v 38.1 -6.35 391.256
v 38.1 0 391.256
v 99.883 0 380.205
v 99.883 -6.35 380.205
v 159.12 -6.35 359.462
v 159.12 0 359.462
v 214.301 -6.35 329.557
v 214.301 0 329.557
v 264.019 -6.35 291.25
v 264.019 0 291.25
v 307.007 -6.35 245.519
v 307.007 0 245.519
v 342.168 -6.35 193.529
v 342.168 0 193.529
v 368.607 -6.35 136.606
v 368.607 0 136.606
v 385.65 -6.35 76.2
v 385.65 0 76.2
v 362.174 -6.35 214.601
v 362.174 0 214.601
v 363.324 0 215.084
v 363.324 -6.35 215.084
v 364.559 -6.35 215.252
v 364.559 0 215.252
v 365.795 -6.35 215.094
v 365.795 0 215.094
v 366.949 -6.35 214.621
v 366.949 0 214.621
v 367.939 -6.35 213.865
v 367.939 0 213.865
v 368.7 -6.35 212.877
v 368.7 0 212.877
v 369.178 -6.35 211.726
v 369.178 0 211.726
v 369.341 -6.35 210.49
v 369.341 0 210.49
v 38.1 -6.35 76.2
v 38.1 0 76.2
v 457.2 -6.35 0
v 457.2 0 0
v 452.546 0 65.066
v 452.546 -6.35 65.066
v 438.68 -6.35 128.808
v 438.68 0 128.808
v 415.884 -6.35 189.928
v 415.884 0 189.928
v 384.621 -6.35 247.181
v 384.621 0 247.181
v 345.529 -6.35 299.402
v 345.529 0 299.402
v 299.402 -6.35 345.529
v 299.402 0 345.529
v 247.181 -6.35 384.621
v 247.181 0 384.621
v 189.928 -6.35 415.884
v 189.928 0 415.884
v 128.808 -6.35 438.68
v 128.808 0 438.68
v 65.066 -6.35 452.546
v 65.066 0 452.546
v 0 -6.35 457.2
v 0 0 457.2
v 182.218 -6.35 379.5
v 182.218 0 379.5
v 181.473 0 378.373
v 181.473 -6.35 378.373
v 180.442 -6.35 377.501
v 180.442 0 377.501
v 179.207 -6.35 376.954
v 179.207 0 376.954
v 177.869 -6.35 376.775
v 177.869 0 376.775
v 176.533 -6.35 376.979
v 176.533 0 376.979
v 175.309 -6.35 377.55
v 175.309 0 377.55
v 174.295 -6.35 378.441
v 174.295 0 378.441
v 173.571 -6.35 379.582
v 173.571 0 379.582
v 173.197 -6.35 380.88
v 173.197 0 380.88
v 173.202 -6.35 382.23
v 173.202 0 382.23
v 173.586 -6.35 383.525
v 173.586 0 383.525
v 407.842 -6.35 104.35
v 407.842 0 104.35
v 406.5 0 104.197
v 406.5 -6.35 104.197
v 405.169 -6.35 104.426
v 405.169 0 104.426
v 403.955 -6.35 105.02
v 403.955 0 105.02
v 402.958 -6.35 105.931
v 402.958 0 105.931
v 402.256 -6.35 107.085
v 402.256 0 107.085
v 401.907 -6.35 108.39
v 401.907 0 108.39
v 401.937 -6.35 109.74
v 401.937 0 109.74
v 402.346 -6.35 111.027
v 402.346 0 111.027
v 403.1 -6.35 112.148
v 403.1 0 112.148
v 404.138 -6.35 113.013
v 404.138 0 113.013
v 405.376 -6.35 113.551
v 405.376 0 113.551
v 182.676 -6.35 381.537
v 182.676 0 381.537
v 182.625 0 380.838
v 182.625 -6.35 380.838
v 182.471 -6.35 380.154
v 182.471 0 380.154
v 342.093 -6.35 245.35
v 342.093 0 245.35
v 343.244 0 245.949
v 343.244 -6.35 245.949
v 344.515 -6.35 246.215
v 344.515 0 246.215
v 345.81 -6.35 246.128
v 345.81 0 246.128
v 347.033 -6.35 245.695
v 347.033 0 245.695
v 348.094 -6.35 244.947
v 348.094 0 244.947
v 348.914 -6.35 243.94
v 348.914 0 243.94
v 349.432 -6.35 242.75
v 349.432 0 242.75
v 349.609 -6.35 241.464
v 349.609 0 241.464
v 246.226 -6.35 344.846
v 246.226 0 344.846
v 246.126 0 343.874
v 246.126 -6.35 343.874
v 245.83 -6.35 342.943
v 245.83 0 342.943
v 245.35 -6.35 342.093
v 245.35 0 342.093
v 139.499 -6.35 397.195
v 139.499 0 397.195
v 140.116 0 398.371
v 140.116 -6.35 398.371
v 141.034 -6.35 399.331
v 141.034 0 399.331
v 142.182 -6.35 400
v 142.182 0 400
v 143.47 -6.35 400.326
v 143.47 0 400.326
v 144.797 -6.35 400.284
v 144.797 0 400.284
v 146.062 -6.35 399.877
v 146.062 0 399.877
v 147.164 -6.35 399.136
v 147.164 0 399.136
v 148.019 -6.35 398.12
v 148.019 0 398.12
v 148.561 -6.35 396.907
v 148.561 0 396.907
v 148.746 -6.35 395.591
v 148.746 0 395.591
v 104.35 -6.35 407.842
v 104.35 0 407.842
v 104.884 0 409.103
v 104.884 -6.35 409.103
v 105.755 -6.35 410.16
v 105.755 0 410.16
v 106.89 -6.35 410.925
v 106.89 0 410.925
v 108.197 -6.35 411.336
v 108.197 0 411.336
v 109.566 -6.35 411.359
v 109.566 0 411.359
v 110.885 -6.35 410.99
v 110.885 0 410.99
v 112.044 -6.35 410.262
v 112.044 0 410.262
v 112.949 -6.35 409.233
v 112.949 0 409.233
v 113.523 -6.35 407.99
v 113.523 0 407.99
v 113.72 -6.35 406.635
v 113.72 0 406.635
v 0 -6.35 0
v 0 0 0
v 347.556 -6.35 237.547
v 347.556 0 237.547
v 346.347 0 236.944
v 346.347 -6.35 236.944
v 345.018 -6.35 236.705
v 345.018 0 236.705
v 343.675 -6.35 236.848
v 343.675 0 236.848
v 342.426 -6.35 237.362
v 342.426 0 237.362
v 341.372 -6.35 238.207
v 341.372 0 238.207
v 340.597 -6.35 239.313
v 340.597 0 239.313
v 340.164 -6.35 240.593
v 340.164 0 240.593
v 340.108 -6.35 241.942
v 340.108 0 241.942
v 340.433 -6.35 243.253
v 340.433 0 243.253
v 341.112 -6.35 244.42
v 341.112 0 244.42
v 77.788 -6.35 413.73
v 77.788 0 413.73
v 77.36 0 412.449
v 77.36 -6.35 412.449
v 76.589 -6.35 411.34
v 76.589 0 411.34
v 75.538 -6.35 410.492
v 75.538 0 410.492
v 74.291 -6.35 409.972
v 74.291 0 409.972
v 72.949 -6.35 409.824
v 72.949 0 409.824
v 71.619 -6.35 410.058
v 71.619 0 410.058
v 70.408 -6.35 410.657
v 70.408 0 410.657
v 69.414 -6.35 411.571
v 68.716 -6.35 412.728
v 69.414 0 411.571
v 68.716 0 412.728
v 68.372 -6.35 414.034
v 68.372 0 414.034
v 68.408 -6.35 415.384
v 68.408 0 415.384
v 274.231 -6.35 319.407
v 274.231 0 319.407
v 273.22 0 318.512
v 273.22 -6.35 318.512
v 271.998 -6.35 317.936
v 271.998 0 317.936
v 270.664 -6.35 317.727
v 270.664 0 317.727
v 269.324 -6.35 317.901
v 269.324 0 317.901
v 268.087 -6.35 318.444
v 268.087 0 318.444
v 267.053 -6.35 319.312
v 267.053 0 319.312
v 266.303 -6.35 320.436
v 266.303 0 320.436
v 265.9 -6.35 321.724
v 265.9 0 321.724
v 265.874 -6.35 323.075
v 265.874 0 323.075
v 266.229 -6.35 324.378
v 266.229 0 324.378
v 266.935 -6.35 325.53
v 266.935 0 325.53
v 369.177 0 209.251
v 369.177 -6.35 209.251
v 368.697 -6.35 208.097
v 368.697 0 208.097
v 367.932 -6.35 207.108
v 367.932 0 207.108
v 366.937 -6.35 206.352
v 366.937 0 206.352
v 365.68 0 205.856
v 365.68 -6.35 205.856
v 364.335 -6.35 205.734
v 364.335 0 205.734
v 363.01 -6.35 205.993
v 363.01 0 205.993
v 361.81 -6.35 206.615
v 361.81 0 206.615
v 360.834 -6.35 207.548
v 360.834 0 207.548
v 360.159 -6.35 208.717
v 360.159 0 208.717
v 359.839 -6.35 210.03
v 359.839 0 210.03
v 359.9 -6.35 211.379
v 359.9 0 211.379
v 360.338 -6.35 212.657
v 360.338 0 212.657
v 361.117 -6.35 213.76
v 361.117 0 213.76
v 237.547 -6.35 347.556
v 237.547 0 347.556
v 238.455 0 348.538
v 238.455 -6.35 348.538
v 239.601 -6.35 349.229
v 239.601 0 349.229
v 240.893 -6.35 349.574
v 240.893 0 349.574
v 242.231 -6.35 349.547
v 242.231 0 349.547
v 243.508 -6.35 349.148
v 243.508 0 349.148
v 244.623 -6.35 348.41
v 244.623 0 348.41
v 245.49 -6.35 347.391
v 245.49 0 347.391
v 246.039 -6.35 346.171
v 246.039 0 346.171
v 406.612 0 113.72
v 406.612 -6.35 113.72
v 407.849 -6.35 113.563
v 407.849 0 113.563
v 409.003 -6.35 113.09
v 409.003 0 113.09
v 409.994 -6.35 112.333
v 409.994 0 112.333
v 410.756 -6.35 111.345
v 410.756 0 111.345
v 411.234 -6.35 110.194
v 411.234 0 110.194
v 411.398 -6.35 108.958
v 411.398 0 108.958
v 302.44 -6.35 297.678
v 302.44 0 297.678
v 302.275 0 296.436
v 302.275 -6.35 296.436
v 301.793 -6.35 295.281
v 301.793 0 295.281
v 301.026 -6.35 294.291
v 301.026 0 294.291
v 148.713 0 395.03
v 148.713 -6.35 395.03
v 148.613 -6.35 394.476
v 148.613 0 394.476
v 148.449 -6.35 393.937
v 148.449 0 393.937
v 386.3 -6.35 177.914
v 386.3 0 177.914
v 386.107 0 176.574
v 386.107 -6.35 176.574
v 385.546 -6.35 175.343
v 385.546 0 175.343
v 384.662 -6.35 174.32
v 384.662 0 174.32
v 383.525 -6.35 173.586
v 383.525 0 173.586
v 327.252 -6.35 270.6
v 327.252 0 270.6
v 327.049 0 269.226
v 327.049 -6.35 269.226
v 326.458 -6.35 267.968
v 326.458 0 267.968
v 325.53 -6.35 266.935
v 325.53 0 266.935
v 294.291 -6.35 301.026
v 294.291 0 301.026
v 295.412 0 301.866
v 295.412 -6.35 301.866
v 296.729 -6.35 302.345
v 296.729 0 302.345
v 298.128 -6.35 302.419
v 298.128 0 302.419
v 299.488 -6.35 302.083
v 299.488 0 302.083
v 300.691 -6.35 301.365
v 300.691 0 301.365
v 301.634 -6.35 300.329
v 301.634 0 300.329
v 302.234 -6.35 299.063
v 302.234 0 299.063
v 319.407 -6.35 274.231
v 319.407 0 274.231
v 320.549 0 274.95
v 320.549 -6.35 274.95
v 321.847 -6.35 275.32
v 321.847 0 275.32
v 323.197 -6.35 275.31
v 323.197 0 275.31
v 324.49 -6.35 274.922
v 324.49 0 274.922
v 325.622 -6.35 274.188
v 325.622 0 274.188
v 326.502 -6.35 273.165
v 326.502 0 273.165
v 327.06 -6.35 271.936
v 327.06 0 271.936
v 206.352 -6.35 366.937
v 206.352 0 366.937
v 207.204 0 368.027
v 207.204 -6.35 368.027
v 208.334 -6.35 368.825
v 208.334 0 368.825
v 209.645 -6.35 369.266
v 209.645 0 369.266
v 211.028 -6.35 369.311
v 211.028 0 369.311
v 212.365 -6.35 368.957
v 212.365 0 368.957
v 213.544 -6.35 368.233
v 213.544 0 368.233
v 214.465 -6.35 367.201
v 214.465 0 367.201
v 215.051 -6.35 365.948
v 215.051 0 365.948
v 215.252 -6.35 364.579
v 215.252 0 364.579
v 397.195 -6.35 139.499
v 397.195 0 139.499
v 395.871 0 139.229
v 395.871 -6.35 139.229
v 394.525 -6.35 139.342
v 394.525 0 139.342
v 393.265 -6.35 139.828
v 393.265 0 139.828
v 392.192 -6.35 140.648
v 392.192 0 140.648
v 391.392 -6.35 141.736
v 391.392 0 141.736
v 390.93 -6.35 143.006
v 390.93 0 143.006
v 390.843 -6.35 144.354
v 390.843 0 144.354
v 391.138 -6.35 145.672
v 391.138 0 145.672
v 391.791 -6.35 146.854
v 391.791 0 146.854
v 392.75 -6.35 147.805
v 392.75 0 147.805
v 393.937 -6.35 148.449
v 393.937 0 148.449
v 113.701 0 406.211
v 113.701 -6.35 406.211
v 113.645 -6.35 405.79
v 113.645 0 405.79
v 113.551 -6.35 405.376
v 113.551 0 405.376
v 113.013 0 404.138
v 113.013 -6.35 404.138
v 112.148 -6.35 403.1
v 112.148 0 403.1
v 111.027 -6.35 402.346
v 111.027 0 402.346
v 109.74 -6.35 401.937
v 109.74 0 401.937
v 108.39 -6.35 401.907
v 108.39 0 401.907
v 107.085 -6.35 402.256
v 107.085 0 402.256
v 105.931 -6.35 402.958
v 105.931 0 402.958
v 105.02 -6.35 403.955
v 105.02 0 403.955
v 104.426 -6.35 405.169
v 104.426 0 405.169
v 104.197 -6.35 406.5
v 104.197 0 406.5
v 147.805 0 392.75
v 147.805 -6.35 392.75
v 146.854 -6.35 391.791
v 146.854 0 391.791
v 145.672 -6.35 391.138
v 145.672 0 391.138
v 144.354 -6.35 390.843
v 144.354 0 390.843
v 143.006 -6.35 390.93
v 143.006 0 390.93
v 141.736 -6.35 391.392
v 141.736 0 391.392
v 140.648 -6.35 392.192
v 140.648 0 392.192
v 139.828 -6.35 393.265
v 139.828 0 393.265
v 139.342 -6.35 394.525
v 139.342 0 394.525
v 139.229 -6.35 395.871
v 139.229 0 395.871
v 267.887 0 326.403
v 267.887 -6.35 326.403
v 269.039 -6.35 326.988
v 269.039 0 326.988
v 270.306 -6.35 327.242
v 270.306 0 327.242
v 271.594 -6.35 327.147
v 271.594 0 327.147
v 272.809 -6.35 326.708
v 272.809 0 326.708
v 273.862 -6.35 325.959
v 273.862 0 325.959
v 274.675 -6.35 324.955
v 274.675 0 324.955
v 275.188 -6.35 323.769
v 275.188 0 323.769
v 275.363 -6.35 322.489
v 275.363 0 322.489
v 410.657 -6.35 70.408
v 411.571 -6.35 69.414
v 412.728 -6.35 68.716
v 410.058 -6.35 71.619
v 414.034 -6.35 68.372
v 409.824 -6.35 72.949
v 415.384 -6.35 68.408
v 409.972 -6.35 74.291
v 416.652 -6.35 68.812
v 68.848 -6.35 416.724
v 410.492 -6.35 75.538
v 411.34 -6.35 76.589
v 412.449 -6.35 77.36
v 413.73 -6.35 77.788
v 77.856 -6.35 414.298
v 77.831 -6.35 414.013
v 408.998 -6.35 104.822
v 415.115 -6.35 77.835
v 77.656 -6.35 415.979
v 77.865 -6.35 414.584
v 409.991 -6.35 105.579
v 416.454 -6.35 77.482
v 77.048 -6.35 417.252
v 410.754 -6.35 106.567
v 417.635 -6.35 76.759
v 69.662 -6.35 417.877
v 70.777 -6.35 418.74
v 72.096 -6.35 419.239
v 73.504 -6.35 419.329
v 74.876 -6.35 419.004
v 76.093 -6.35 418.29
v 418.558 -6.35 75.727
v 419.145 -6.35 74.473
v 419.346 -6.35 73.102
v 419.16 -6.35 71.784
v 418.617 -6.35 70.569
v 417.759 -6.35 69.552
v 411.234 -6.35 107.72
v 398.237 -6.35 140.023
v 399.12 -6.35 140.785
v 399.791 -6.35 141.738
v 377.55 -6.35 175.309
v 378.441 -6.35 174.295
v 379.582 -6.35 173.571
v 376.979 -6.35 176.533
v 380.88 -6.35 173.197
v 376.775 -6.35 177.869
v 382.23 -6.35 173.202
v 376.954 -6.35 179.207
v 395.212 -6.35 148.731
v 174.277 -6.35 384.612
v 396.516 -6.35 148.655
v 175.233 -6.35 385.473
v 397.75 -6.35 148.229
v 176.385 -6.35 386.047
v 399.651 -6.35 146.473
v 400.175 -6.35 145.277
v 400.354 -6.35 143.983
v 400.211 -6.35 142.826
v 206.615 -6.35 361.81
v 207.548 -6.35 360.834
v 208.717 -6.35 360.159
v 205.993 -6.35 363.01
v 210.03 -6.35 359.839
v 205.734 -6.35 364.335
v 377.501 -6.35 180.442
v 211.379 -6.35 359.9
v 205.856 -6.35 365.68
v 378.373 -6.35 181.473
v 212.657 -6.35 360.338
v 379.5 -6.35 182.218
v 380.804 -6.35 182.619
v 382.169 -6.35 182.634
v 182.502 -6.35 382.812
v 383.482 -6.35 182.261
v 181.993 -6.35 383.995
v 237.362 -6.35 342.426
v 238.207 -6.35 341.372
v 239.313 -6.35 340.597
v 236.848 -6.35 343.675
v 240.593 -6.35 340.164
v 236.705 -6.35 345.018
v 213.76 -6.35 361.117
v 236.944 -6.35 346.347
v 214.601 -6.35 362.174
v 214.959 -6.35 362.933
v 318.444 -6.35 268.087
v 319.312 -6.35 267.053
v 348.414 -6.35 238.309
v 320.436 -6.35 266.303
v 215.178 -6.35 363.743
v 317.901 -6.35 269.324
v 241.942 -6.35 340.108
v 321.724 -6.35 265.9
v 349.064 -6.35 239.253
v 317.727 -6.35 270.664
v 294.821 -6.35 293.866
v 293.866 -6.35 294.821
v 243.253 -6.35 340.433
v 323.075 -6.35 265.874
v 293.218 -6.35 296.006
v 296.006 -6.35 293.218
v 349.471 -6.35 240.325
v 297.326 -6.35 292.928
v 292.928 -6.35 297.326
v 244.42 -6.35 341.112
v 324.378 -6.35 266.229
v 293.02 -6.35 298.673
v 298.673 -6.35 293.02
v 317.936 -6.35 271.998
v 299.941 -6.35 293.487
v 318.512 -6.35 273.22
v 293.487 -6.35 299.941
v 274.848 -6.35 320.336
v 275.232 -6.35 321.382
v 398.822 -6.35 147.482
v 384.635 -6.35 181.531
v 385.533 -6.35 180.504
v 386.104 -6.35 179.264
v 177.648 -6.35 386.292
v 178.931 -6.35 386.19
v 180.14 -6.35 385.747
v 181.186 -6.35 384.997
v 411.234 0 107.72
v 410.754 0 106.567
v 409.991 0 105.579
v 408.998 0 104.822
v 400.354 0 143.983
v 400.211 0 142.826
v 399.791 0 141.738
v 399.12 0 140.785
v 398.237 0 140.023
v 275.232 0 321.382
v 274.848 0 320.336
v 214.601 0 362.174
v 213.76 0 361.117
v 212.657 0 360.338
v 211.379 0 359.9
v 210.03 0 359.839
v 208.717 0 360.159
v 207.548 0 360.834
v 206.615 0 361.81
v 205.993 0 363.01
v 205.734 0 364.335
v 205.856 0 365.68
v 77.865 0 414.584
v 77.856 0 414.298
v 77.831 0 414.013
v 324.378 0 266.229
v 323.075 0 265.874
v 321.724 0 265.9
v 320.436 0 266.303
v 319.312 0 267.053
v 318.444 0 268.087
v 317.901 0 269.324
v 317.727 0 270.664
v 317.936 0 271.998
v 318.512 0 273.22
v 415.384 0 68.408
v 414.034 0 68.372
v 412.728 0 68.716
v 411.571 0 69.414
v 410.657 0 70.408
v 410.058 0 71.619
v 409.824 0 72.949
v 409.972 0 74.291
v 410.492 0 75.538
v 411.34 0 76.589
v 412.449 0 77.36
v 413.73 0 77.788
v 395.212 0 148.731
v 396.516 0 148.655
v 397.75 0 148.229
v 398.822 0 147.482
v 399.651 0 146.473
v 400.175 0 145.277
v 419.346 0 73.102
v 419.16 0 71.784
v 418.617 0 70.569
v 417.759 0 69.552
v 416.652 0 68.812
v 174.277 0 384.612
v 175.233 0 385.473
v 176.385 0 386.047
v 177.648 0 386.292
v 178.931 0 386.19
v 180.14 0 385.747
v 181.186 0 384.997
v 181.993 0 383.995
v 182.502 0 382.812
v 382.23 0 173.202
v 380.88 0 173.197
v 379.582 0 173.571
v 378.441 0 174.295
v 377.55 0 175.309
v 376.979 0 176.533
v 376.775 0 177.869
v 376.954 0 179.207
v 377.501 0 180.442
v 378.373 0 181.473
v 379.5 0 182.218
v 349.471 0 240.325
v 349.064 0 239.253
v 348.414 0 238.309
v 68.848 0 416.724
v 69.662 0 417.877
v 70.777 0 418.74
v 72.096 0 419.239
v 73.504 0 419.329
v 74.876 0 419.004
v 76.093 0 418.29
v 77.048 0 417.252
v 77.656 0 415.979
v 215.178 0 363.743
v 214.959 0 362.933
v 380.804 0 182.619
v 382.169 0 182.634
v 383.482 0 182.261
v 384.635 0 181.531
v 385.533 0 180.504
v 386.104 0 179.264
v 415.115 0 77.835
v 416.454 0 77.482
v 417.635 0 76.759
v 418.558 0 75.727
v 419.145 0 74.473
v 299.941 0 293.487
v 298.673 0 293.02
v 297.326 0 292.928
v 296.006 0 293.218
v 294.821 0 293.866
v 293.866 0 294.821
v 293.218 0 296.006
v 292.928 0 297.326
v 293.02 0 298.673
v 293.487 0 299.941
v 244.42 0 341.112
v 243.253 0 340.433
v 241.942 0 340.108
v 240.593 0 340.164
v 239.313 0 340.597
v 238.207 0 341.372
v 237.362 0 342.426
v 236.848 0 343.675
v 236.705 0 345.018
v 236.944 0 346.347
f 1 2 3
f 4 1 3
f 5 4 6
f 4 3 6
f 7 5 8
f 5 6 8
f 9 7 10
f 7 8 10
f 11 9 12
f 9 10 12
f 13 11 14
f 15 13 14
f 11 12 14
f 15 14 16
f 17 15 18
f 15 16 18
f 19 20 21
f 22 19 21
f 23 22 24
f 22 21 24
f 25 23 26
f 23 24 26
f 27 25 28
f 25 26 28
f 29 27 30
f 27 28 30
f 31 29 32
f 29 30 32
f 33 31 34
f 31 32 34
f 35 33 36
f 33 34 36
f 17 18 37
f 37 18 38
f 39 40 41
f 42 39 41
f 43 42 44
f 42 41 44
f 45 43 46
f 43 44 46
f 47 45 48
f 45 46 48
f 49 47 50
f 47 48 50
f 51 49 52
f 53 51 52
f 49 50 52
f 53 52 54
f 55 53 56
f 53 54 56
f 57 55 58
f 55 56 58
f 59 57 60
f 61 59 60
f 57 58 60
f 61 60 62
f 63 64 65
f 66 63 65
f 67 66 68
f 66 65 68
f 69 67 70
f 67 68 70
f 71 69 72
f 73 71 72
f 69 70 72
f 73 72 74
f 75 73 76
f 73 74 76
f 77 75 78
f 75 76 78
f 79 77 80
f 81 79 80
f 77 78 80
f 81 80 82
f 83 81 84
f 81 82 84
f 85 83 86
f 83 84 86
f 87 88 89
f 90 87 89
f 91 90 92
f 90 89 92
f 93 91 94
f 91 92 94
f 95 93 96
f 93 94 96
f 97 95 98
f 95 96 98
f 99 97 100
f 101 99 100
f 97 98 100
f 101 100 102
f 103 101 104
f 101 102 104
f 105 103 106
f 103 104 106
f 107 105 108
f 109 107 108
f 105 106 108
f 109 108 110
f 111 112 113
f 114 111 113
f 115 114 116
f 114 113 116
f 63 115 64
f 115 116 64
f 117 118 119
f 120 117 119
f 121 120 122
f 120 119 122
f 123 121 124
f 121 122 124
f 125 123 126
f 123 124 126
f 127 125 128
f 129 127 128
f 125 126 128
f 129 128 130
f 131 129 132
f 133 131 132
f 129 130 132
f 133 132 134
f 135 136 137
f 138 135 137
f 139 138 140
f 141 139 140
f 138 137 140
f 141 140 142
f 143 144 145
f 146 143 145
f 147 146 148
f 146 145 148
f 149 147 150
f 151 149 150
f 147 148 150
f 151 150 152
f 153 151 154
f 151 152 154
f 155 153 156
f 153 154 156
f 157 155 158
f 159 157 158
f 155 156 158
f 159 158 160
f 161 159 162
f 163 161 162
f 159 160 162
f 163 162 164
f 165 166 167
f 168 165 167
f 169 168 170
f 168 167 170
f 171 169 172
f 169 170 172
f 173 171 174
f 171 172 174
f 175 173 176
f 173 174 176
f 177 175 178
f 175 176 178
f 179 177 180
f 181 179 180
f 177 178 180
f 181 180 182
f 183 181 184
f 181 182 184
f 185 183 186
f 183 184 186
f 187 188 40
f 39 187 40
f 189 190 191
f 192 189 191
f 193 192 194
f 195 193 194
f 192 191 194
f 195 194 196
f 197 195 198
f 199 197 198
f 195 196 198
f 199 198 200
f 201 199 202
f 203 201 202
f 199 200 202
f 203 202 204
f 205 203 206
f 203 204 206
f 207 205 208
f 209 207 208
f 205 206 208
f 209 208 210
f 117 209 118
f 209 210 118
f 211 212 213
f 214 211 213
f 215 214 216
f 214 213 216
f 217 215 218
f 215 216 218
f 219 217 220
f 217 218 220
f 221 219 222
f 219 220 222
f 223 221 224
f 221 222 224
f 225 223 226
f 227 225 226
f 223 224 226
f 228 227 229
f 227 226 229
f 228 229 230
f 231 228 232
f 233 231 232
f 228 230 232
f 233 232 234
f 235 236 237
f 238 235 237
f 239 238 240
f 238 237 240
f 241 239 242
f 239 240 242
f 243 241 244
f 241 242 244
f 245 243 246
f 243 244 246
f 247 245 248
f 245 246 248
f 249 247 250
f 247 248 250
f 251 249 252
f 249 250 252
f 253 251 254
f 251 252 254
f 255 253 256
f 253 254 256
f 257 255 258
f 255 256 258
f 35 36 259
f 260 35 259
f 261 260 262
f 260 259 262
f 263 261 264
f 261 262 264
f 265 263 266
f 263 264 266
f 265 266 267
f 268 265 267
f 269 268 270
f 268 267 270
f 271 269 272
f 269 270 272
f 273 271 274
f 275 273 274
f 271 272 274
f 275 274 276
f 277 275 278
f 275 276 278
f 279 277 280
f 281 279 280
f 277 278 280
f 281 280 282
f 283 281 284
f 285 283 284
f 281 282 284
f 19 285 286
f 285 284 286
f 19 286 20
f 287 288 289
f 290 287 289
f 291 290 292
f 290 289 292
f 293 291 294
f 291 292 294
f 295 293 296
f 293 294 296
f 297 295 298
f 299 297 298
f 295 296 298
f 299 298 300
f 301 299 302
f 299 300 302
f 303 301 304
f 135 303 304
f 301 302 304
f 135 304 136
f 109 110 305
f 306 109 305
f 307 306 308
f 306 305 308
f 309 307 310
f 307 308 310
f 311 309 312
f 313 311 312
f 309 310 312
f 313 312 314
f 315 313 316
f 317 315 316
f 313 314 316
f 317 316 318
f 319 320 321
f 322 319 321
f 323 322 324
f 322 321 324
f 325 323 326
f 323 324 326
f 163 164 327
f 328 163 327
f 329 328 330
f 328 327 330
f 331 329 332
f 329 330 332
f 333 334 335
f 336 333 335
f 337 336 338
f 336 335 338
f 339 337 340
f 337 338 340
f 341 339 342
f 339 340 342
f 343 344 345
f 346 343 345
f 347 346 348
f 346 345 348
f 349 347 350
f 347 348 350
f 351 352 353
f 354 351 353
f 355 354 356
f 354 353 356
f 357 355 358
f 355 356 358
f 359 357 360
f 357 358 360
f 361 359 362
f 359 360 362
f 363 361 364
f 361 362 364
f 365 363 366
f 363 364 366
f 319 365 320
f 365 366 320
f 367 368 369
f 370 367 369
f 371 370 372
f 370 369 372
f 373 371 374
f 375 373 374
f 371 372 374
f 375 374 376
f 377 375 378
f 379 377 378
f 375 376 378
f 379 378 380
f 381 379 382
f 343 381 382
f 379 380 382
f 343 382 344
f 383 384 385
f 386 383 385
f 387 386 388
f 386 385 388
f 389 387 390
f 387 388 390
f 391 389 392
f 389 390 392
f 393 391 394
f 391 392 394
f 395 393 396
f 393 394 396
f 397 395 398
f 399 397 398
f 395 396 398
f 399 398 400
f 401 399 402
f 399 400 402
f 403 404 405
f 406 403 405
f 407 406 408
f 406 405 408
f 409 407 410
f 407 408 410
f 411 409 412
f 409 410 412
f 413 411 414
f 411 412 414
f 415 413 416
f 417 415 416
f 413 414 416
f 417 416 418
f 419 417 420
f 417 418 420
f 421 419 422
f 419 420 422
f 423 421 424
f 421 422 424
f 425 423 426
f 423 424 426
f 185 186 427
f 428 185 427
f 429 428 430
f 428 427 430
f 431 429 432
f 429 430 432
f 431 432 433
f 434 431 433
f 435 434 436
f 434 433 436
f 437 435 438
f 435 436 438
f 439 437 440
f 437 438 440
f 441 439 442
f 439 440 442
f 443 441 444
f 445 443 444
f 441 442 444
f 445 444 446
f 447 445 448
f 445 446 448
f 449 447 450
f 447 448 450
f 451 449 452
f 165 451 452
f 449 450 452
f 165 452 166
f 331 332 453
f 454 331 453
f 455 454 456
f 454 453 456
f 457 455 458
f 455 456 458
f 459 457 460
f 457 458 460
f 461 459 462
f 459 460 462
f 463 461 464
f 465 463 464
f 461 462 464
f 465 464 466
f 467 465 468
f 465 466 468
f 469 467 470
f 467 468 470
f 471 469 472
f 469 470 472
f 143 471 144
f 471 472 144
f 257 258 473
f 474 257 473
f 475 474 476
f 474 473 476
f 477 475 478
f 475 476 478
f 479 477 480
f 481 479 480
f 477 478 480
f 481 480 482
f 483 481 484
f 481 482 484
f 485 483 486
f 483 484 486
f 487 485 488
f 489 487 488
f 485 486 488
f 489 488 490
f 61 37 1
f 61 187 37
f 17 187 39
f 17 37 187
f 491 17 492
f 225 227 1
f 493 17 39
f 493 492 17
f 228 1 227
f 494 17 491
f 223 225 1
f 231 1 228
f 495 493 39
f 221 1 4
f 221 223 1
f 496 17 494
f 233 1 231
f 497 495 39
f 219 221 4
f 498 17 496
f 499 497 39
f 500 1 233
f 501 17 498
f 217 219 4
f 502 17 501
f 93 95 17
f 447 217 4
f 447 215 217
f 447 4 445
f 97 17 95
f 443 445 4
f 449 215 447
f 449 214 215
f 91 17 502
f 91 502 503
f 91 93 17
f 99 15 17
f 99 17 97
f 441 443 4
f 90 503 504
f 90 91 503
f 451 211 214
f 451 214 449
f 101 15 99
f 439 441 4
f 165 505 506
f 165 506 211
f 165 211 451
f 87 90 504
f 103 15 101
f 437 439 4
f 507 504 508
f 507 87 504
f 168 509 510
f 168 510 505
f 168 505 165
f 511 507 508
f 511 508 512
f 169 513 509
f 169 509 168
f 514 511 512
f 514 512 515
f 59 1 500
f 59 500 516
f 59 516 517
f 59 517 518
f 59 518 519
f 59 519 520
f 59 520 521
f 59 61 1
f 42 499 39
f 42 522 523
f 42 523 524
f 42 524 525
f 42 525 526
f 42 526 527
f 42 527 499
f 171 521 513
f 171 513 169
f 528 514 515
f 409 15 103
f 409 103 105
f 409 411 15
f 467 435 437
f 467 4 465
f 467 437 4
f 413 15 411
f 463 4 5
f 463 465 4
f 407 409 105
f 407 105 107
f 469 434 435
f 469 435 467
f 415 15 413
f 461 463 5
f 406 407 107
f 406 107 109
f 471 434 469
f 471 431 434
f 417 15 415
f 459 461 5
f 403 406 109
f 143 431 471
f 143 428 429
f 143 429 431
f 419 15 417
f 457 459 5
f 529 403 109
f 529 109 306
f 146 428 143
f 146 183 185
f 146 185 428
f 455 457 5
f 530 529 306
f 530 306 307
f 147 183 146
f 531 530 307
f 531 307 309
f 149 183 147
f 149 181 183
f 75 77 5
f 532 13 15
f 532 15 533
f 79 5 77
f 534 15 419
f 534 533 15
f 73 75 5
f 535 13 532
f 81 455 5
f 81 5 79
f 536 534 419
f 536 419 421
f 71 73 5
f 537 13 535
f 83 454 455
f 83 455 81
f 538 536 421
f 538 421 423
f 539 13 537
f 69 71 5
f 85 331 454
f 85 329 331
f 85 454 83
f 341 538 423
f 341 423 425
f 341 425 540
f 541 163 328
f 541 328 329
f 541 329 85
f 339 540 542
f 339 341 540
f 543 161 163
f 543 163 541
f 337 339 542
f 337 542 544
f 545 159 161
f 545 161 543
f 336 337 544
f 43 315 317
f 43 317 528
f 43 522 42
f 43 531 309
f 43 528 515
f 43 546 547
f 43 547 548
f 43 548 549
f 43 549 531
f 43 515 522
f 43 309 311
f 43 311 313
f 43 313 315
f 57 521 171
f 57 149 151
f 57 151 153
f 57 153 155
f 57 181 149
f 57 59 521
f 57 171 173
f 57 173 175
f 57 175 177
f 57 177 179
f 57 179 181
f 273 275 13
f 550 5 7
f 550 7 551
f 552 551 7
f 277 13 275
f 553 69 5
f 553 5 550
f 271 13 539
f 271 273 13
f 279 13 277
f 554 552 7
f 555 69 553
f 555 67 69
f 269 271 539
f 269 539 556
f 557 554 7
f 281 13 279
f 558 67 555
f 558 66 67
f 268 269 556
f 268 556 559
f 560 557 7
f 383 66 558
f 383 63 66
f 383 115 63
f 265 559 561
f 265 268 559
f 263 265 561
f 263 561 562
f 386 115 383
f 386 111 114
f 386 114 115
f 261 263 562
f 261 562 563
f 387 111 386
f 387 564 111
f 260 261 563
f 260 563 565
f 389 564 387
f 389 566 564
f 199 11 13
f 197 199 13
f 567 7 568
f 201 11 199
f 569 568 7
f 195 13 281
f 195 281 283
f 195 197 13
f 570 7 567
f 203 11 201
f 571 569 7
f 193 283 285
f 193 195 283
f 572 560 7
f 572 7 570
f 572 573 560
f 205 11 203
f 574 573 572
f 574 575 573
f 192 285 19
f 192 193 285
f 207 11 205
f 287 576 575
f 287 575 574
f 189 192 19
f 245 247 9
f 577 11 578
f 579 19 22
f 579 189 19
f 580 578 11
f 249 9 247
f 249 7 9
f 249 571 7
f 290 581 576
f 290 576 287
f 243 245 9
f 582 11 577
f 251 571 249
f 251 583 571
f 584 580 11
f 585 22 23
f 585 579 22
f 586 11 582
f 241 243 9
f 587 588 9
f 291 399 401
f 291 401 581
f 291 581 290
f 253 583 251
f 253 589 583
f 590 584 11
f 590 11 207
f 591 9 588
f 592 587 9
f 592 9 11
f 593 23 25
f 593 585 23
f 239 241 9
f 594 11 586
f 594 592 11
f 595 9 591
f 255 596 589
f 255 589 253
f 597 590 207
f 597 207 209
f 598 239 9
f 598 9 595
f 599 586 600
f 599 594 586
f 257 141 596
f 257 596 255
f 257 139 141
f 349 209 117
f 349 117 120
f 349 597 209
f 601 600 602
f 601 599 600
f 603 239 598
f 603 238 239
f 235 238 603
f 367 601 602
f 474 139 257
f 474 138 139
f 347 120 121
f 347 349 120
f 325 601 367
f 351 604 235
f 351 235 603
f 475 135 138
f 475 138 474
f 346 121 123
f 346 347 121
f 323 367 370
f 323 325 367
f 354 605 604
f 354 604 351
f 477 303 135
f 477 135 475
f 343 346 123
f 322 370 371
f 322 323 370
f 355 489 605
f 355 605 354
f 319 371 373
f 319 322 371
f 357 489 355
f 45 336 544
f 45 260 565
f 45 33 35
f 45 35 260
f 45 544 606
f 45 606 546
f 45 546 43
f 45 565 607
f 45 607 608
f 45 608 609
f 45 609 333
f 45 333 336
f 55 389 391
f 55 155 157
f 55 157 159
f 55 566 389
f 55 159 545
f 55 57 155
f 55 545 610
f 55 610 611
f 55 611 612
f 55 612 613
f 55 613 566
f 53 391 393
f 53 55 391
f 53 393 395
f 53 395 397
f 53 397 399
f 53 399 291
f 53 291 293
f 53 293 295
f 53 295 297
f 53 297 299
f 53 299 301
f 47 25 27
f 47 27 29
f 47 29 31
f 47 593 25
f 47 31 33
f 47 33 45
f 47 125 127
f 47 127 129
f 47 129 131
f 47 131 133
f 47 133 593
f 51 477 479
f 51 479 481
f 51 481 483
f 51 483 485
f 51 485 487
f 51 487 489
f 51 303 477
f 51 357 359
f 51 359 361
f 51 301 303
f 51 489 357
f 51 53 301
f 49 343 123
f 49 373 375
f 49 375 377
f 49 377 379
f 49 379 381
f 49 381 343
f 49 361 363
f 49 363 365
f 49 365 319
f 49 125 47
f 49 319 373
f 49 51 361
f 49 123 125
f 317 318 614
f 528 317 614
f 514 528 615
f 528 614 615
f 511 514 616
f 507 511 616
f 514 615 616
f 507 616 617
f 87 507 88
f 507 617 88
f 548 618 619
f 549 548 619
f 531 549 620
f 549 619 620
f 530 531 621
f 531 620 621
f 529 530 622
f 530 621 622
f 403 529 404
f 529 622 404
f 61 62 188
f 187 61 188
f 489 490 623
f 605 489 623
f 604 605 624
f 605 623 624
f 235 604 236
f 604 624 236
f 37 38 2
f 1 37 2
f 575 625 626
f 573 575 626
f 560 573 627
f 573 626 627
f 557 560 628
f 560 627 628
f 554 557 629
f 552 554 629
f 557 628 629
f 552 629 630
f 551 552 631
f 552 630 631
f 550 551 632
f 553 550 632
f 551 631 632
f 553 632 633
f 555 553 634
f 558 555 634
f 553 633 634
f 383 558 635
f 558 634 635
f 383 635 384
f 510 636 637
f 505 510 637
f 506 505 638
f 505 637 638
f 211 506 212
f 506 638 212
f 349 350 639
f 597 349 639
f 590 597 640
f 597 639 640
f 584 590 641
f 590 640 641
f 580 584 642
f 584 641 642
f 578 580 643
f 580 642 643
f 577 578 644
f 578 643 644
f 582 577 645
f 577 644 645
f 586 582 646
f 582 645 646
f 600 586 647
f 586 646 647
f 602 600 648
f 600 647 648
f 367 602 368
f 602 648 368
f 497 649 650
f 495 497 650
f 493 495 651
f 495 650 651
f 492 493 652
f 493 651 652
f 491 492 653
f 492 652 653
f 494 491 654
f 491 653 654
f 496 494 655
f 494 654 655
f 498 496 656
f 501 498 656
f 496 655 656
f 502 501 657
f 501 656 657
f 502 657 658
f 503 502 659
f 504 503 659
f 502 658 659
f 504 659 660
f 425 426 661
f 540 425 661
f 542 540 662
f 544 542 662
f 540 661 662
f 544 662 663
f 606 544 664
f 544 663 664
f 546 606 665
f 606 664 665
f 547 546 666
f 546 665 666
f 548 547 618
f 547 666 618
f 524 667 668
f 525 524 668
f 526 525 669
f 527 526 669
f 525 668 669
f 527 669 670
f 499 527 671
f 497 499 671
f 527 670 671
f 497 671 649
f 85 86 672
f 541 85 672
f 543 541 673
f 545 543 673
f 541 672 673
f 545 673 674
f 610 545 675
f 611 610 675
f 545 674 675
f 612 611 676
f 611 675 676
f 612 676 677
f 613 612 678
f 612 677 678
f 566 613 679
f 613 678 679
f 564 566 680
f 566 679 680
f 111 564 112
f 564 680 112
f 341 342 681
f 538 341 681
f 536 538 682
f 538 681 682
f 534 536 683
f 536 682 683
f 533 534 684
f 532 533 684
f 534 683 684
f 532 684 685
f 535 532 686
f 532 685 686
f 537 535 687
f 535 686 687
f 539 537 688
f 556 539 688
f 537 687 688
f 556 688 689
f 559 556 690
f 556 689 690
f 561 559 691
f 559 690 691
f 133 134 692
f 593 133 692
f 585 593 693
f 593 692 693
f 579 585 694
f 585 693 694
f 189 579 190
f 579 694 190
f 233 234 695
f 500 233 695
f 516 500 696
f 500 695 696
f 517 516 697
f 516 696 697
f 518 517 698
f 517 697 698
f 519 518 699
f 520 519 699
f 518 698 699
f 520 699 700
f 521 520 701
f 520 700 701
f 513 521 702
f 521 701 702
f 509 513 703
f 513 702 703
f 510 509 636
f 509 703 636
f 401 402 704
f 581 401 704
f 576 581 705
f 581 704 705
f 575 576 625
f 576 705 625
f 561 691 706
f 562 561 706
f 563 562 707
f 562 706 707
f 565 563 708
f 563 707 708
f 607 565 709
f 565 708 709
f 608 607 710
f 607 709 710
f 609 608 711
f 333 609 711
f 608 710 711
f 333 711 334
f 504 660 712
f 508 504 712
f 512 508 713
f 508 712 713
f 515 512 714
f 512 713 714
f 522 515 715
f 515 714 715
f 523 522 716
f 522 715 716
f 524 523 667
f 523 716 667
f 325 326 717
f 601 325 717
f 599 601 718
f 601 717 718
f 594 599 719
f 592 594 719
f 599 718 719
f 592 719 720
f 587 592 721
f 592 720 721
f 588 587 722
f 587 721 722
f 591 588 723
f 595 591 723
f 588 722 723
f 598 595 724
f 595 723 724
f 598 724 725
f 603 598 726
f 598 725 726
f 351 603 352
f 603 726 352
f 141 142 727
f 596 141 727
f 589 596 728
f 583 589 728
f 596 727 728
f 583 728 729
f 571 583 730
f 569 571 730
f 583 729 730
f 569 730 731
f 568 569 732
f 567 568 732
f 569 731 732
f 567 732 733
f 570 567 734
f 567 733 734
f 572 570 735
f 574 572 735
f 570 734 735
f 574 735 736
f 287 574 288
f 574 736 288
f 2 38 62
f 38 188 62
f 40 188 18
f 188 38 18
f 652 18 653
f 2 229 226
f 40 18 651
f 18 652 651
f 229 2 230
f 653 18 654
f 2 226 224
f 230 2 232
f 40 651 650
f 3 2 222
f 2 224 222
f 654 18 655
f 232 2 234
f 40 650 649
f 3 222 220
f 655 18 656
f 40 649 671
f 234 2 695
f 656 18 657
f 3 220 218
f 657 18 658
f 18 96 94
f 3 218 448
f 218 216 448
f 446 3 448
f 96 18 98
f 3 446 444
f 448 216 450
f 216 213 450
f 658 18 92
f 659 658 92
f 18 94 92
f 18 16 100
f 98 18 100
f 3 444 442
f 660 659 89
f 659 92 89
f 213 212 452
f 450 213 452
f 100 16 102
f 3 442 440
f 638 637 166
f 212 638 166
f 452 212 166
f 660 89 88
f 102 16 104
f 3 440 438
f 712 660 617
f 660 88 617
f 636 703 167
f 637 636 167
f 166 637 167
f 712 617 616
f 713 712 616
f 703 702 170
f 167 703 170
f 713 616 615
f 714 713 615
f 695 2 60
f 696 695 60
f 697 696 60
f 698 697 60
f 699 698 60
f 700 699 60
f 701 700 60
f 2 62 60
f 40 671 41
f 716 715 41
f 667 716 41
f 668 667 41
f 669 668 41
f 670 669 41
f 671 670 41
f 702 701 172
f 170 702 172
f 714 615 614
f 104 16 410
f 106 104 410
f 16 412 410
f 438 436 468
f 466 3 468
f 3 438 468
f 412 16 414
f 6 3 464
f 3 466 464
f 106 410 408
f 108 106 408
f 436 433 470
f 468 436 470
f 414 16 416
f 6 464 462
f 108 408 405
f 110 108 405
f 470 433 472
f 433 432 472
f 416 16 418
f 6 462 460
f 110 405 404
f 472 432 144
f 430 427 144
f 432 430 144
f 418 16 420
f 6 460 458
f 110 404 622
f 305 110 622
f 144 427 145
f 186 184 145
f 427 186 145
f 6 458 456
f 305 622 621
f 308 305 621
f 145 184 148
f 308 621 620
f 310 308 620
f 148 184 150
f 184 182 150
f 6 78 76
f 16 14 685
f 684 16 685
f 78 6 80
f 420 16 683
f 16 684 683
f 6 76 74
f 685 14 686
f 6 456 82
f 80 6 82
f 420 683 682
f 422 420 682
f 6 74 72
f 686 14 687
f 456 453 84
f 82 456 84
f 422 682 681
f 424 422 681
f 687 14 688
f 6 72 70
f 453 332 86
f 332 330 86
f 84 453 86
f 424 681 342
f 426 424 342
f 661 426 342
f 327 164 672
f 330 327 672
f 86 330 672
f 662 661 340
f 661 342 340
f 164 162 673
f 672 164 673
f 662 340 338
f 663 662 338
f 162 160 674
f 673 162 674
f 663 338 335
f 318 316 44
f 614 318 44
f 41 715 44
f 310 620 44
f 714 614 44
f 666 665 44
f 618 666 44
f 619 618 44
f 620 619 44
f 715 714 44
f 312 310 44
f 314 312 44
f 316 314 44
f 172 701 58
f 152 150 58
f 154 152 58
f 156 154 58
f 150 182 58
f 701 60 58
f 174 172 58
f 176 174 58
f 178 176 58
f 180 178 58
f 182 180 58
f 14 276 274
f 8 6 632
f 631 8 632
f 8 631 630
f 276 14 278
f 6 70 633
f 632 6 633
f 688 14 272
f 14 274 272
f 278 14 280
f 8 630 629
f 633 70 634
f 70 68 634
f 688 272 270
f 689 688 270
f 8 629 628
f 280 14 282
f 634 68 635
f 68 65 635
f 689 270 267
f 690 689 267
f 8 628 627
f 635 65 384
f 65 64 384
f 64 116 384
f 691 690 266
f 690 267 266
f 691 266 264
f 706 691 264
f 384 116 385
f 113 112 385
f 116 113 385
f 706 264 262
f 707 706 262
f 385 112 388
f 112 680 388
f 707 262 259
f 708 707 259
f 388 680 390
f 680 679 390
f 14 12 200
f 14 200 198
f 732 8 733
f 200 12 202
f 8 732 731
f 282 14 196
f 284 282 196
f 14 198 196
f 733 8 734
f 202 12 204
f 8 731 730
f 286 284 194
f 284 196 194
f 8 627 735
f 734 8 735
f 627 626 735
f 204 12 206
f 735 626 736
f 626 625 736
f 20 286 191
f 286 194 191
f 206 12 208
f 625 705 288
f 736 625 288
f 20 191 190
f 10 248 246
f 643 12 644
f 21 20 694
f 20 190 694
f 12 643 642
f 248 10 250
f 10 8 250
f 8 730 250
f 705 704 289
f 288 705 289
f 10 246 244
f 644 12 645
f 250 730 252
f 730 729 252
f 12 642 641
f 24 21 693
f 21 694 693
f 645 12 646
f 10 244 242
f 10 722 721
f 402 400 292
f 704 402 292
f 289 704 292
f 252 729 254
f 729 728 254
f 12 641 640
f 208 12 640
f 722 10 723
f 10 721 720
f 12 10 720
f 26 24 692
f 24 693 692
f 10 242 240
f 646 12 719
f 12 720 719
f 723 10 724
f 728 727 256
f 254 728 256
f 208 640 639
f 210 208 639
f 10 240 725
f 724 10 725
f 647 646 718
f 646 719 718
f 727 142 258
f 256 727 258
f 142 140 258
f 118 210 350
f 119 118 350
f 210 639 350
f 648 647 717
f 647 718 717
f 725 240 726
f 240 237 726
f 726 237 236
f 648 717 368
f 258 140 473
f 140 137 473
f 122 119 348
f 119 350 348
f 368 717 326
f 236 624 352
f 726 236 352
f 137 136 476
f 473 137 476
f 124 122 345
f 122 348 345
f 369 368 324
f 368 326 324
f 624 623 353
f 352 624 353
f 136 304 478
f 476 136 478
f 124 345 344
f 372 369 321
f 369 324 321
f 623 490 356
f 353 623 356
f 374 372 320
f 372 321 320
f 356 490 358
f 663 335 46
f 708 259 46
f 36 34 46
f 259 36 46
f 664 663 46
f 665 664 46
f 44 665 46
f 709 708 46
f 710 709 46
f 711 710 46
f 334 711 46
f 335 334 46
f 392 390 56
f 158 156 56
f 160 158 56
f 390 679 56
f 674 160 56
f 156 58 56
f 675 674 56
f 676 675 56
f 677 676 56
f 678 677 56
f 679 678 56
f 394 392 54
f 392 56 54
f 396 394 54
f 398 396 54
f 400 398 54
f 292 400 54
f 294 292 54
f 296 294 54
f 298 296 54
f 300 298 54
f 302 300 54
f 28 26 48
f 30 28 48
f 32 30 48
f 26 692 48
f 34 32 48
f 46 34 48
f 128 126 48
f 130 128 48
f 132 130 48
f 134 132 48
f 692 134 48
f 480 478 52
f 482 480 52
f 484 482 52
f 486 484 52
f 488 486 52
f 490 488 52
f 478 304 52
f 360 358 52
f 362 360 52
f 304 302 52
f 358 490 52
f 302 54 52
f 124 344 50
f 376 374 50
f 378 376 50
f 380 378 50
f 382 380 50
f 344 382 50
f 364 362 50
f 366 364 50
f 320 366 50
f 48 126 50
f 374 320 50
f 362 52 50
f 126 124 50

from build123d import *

# Parameters (mm, degrees)
F1_DEPTH = 6.35


with BuildPart() as f1:
    # F0 (on Front) → F1 (new body)
    with BuildSketch(Plane.XZ):
        with BuildLine():
            Line((0, 420.979559), (0, 0))
            Line((0, 0), (420.979559, 0))
            ThreePointArc((420.979559, 0), (419.578436, 34.318011), (415.384391, 68.407584))
            ThreePointArc((415.384391, 68.407584), (409.893787, 72.275334), (413.730418, 77.787727))
            ThreePointArc((413.730418, 77.787727), (411.000663, 91.116653), (407.841614, 104.350407))
            ThreePointArc((407.841614, 104.350407), (402.034807, 107.724902), (405.376402, 113.550703))
            ThreePointArc((405.376402, 113.550703), (401.495342, 126.590995), (397.194916, 139.499061))
            ThreePointArc((397.194916, 139.499061), (391.116099, 142.354618), (393.937226, 148.44949))
            ThreePointArc((393.937226, 148.44949), (388.934399, 161.101903), (383.525325, 173.586043))
            ThreePointArc((383.525325, 173.586043), (377.220762, 175.90093), (379.499951, 182.218487))
            ThreePointArc((379.499951, 182.218487), (373.41343, 194.386728), (366.936875, 206.35193))
            ThreePointArc((366.936875, 206.35193), (360.454547, 208.10853), (362.174451, 214.60069))
            ThreePointArc((362.174451, 214.60069), (355.050559, 226.192152), (347.555814, 237.547355))
            ThreePointArc((347.555814, 237.547355), (340.945055, 238.732298), (342.092586, 245.349653))
            ThreePointArc((342.092586, 245.349653), (333.98554, 256.276118), (325.529643, 266.9349))
            ThreePointArc((325.529643, 266.9349), (318.840766, 267.539169), (319.407189, 274.231357))
            ThreePointArc((319.407189, 274.231357), (310.378688, 284.409668), (301.025995, 294.29091))
            ThreePointArc((301.025995, 294.29091), (294.309905, 294.309905), (294.29091, 301.025995))
            ThreePointArc((294.29091, 301.025995), (284.409668, 310.378688), (274.231357, 319.407189))
            ThreePointArc((274.231357, 319.407189), (267.539169, 318.840766), (266.9349, 325.529643))
            ThreePointArc((266.9349, 325.529643), (256.276118, 333.98554), (245.349653, 342.092586))
            ThreePointArc((245.349653, 342.092586), (238.732298, 340.945055), (237.547355, 347.555814))
            ThreePointArc((237.547355, 347.555814), (226.192152, 355.050559), (214.60069, 362.174451))
            ThreePointArc((214.60069, 362.174451), (208.10853, 360.454547), (206.35193, 366.936875))
            ThreePointArc((206.35193, 366.936875), (194.386728, 373.41343), (182.218487, 379.499951))
            ThreePointArc((182.218487, 379.499951), (175.90093, 377.220762), (173.586043, 383.525325))
            ThreePointArc((173.586043, 383.525325), (161.101903, 388.934399), (148.44949, 393.937226))
            ThreePointArc((148.44949, 393.937226), (142.354618, 391.116099), (139.499061, 397.194916))
            ThreePointArc((139.499061, 397.194916), (126.590995, 401.495342), (113.550703, 405.376402))
            ThreePointArc((113.550703, 405.376402), (107.724902, 402.034807), (104.350407, 407.841614))
            ThreePointArc((104.350407, 407.841614), (91.116653, 411.000663), (77.787727, 413.730418))
            ThreePointArc((77.787727, 413.730418), (72.275334, 409.893787), (68.407584, 415.384391))
            ThreePointArc((68.407584, 415.384391), (34.318011, 419.578436), (0, 420.979559))
        make_face()
        with BuildLine():
            Line((385.650199, 76.2), (38.1, 76.2))
            Line((38.1, 76.2), (38.1, 391.255551))
            ThreePointArc((38.1, 391.255551), (264.019048, 291.249821), (385.650199, 76.2))
        make_face(mode=Mode.SUBTRACT)
        with BuildLine():
            Line((0, 457.2), (0, 420.979559))
            ThreePointArc((0, 420.979559), (34.318011, 419.578436), (68.407584, 415.384391))
            ThreePointArc((68.407584, 415.384391), (73.503993, 419.329466), (77.864833, 414.583934))
            ThreePointArc((77.864833, 414.583934), (77.845518, 414.155438), (77.787727, 413.730418))
            ThreePointArc((77.787727, 413.730418), (91.116653, 411.000663), (104.350407, 407.841614))
            ThreePointArc((104.350407, 407.841614), (109.565802, 411.358524), (113.720028, 406.635029))
            ThreePointArc((113.720028, 406.635029), (113.677507, 406.000046), (113.550703, 405.376402))
            ThreePointArc((113.550703, 405.376402), (126.590995, 401.495342), (139.499061, 397.194916))
            ThreePointArc((139.499061, 397.194916), (144.797221, 400.283853), (148.745989, 395.591385))
            ThreePointArc((148.745989, 395.591385), (148.671278, 394.751125), (148.44949, 393.937226))
            ThreePointArc((148.44949, 393.937226), (161.101903, 388.934399), (173.586043, 383.525325))
            ThreePointArc((173.586043, 383.525325), (178.931289, 386.189559), (182.67615, 381.537053))
            ThreePointArc((182.67615, 381.537053), (182.560325, 380.493113), (182.218487, 379.499951))
            ThreePointArc((182.218487, 379.499951), (194.386728, 373.41343), (206.35193, 366.936875))
            ThreePointArc((206.35193, 366.936875), (211.70939, 369.182682), (215.25228, 364.578993))
            ThreePointArc((215.25228, 364.578993), (215.086497, 363.333362), (214.60069, 362.174451))
            ThreePointArc((214.60069, 362.174451), (226.192152, 355.050559), (237.547355, 347.555814))
            ThreePointArc((237.547355, 347.555814), (242.883215, 349.392376), (246.226455, 344.846267))
            ThreePointArc((246.226455, 344.846267), (246.001964, 343.401315), (245.349653, 342.092586))
            ThreePointArc((245.349653, 342.092586), (256.276118, 333.98554), (266.9349, 325.529643))
            ThreePointArc((266.9349, 325.529643), (272.216652, 326.968927), (275.362945, 322.489052))
            ThreePointArc((275.362945, 322.489052), (275.071106, 320.847531), (274.231357, 319.407189))
            ThreePointArc((274.231357, 319.407189), (284.409668, 310.378688), (294.29091, 301.025995))
            ThreePointArc((294.29091, 301.025995), (299.48758, 302.082614), (302.440001, 297.677501))
            ThreePointArc((302.440001, 297.677501), (302.072305, 295.842534), (301.025995, 294.29091))
            ThreePointArc((301.025995, 294.29091), (310.378688, 284.409668), (319.407189, 274.231357))
            ThreePointArc((319.407189, 274.231357), (324.489556, 274.922411), (327.251552, 270.600445))
            ThreePointArc((327.251552, 270.600445), (326.799633, 268.575526), (325.529643, 266.9349))
            ThreePointArc((325.529643, 266.9349), (333.98554, 256.276118), (342.092586, 245.349653))
            ThreePointArc((342.092586, 245.349653), (347.033388, 245.694547), (349.608767, 241.463955))
            ThreePointArc((349.608767, 241.463955), (349.064419, 239.252939), (347.555814, 237.547355))
            ThreePointArc((347.555814, 237.547355), (355.050559, 226.192152), (362.174451, 214.60069))
            ThreePointArc((362.174451, 214.60069), (366.948569, 214.620944), (369.341493, 210.48978))
            ThreePointArc((369.341493, 210.48978), (368.696688, 208.096874), (366.936875, 206.35193))
            ThreePointArc((366.936875, 206.35193), (373.41343, 194.386728), (379.499951, 182.218487))
            ThreePointArc((379.499951, 182.218487), (384.084572, 181.937522), (386.299553, 177.91365))
            ThreePointArc((386.299553, 177.91365), (385.546451, 175.34341), (383.525325, 173.586043))
            ThreePointArc((383.525325, 173.586043), (388.934399, 161.101903), (393.937226, 148.44949))
            ThreePointArc((393.937226, 148.44949), (398.311999, 147.892411), (400.353885, 143.983489))
            ThreePointArc((400.353885, 143.983489), (399.484856, 141.240809), (397.194916, 139.499061))
            ThreePointArc((397.194916, 139.499061), (401.495342, 126.590995), (405.376402, 113.550703))
            ThreePointArc((405.376402, 113.550703), (409.523557, 112.744057), (411.397529, 108.957528))
            ThreePointArc((411.397529, 108.957528), (410.405159, 106.047627), (407.841614, 104.350407))
            ThreePointArc((407.841614, 104.350407), (411.000663, 91.116653), (413.730418, 77.787727))
            ThreePointArc((413.730418, 77.787727), (417.63488, 76.759263), (419.346434, 73.102333))
            ThreePointArc((419.346434, 73.102333), (418.223548, 70.030751), (415.384391, 68.407584))
            ThreePointArc((415.384391, 68.407584), (419.578436, 34.318011), (420.979559, 0))
            Line((420.979559, 0), (457.2, 0))
            ThreePointArc((457.2, 0), (323.28922, 323.28922), (0, 457.2))
        make_face()
    extrude(amount=F1_DEPTH)


solid = f1.part
